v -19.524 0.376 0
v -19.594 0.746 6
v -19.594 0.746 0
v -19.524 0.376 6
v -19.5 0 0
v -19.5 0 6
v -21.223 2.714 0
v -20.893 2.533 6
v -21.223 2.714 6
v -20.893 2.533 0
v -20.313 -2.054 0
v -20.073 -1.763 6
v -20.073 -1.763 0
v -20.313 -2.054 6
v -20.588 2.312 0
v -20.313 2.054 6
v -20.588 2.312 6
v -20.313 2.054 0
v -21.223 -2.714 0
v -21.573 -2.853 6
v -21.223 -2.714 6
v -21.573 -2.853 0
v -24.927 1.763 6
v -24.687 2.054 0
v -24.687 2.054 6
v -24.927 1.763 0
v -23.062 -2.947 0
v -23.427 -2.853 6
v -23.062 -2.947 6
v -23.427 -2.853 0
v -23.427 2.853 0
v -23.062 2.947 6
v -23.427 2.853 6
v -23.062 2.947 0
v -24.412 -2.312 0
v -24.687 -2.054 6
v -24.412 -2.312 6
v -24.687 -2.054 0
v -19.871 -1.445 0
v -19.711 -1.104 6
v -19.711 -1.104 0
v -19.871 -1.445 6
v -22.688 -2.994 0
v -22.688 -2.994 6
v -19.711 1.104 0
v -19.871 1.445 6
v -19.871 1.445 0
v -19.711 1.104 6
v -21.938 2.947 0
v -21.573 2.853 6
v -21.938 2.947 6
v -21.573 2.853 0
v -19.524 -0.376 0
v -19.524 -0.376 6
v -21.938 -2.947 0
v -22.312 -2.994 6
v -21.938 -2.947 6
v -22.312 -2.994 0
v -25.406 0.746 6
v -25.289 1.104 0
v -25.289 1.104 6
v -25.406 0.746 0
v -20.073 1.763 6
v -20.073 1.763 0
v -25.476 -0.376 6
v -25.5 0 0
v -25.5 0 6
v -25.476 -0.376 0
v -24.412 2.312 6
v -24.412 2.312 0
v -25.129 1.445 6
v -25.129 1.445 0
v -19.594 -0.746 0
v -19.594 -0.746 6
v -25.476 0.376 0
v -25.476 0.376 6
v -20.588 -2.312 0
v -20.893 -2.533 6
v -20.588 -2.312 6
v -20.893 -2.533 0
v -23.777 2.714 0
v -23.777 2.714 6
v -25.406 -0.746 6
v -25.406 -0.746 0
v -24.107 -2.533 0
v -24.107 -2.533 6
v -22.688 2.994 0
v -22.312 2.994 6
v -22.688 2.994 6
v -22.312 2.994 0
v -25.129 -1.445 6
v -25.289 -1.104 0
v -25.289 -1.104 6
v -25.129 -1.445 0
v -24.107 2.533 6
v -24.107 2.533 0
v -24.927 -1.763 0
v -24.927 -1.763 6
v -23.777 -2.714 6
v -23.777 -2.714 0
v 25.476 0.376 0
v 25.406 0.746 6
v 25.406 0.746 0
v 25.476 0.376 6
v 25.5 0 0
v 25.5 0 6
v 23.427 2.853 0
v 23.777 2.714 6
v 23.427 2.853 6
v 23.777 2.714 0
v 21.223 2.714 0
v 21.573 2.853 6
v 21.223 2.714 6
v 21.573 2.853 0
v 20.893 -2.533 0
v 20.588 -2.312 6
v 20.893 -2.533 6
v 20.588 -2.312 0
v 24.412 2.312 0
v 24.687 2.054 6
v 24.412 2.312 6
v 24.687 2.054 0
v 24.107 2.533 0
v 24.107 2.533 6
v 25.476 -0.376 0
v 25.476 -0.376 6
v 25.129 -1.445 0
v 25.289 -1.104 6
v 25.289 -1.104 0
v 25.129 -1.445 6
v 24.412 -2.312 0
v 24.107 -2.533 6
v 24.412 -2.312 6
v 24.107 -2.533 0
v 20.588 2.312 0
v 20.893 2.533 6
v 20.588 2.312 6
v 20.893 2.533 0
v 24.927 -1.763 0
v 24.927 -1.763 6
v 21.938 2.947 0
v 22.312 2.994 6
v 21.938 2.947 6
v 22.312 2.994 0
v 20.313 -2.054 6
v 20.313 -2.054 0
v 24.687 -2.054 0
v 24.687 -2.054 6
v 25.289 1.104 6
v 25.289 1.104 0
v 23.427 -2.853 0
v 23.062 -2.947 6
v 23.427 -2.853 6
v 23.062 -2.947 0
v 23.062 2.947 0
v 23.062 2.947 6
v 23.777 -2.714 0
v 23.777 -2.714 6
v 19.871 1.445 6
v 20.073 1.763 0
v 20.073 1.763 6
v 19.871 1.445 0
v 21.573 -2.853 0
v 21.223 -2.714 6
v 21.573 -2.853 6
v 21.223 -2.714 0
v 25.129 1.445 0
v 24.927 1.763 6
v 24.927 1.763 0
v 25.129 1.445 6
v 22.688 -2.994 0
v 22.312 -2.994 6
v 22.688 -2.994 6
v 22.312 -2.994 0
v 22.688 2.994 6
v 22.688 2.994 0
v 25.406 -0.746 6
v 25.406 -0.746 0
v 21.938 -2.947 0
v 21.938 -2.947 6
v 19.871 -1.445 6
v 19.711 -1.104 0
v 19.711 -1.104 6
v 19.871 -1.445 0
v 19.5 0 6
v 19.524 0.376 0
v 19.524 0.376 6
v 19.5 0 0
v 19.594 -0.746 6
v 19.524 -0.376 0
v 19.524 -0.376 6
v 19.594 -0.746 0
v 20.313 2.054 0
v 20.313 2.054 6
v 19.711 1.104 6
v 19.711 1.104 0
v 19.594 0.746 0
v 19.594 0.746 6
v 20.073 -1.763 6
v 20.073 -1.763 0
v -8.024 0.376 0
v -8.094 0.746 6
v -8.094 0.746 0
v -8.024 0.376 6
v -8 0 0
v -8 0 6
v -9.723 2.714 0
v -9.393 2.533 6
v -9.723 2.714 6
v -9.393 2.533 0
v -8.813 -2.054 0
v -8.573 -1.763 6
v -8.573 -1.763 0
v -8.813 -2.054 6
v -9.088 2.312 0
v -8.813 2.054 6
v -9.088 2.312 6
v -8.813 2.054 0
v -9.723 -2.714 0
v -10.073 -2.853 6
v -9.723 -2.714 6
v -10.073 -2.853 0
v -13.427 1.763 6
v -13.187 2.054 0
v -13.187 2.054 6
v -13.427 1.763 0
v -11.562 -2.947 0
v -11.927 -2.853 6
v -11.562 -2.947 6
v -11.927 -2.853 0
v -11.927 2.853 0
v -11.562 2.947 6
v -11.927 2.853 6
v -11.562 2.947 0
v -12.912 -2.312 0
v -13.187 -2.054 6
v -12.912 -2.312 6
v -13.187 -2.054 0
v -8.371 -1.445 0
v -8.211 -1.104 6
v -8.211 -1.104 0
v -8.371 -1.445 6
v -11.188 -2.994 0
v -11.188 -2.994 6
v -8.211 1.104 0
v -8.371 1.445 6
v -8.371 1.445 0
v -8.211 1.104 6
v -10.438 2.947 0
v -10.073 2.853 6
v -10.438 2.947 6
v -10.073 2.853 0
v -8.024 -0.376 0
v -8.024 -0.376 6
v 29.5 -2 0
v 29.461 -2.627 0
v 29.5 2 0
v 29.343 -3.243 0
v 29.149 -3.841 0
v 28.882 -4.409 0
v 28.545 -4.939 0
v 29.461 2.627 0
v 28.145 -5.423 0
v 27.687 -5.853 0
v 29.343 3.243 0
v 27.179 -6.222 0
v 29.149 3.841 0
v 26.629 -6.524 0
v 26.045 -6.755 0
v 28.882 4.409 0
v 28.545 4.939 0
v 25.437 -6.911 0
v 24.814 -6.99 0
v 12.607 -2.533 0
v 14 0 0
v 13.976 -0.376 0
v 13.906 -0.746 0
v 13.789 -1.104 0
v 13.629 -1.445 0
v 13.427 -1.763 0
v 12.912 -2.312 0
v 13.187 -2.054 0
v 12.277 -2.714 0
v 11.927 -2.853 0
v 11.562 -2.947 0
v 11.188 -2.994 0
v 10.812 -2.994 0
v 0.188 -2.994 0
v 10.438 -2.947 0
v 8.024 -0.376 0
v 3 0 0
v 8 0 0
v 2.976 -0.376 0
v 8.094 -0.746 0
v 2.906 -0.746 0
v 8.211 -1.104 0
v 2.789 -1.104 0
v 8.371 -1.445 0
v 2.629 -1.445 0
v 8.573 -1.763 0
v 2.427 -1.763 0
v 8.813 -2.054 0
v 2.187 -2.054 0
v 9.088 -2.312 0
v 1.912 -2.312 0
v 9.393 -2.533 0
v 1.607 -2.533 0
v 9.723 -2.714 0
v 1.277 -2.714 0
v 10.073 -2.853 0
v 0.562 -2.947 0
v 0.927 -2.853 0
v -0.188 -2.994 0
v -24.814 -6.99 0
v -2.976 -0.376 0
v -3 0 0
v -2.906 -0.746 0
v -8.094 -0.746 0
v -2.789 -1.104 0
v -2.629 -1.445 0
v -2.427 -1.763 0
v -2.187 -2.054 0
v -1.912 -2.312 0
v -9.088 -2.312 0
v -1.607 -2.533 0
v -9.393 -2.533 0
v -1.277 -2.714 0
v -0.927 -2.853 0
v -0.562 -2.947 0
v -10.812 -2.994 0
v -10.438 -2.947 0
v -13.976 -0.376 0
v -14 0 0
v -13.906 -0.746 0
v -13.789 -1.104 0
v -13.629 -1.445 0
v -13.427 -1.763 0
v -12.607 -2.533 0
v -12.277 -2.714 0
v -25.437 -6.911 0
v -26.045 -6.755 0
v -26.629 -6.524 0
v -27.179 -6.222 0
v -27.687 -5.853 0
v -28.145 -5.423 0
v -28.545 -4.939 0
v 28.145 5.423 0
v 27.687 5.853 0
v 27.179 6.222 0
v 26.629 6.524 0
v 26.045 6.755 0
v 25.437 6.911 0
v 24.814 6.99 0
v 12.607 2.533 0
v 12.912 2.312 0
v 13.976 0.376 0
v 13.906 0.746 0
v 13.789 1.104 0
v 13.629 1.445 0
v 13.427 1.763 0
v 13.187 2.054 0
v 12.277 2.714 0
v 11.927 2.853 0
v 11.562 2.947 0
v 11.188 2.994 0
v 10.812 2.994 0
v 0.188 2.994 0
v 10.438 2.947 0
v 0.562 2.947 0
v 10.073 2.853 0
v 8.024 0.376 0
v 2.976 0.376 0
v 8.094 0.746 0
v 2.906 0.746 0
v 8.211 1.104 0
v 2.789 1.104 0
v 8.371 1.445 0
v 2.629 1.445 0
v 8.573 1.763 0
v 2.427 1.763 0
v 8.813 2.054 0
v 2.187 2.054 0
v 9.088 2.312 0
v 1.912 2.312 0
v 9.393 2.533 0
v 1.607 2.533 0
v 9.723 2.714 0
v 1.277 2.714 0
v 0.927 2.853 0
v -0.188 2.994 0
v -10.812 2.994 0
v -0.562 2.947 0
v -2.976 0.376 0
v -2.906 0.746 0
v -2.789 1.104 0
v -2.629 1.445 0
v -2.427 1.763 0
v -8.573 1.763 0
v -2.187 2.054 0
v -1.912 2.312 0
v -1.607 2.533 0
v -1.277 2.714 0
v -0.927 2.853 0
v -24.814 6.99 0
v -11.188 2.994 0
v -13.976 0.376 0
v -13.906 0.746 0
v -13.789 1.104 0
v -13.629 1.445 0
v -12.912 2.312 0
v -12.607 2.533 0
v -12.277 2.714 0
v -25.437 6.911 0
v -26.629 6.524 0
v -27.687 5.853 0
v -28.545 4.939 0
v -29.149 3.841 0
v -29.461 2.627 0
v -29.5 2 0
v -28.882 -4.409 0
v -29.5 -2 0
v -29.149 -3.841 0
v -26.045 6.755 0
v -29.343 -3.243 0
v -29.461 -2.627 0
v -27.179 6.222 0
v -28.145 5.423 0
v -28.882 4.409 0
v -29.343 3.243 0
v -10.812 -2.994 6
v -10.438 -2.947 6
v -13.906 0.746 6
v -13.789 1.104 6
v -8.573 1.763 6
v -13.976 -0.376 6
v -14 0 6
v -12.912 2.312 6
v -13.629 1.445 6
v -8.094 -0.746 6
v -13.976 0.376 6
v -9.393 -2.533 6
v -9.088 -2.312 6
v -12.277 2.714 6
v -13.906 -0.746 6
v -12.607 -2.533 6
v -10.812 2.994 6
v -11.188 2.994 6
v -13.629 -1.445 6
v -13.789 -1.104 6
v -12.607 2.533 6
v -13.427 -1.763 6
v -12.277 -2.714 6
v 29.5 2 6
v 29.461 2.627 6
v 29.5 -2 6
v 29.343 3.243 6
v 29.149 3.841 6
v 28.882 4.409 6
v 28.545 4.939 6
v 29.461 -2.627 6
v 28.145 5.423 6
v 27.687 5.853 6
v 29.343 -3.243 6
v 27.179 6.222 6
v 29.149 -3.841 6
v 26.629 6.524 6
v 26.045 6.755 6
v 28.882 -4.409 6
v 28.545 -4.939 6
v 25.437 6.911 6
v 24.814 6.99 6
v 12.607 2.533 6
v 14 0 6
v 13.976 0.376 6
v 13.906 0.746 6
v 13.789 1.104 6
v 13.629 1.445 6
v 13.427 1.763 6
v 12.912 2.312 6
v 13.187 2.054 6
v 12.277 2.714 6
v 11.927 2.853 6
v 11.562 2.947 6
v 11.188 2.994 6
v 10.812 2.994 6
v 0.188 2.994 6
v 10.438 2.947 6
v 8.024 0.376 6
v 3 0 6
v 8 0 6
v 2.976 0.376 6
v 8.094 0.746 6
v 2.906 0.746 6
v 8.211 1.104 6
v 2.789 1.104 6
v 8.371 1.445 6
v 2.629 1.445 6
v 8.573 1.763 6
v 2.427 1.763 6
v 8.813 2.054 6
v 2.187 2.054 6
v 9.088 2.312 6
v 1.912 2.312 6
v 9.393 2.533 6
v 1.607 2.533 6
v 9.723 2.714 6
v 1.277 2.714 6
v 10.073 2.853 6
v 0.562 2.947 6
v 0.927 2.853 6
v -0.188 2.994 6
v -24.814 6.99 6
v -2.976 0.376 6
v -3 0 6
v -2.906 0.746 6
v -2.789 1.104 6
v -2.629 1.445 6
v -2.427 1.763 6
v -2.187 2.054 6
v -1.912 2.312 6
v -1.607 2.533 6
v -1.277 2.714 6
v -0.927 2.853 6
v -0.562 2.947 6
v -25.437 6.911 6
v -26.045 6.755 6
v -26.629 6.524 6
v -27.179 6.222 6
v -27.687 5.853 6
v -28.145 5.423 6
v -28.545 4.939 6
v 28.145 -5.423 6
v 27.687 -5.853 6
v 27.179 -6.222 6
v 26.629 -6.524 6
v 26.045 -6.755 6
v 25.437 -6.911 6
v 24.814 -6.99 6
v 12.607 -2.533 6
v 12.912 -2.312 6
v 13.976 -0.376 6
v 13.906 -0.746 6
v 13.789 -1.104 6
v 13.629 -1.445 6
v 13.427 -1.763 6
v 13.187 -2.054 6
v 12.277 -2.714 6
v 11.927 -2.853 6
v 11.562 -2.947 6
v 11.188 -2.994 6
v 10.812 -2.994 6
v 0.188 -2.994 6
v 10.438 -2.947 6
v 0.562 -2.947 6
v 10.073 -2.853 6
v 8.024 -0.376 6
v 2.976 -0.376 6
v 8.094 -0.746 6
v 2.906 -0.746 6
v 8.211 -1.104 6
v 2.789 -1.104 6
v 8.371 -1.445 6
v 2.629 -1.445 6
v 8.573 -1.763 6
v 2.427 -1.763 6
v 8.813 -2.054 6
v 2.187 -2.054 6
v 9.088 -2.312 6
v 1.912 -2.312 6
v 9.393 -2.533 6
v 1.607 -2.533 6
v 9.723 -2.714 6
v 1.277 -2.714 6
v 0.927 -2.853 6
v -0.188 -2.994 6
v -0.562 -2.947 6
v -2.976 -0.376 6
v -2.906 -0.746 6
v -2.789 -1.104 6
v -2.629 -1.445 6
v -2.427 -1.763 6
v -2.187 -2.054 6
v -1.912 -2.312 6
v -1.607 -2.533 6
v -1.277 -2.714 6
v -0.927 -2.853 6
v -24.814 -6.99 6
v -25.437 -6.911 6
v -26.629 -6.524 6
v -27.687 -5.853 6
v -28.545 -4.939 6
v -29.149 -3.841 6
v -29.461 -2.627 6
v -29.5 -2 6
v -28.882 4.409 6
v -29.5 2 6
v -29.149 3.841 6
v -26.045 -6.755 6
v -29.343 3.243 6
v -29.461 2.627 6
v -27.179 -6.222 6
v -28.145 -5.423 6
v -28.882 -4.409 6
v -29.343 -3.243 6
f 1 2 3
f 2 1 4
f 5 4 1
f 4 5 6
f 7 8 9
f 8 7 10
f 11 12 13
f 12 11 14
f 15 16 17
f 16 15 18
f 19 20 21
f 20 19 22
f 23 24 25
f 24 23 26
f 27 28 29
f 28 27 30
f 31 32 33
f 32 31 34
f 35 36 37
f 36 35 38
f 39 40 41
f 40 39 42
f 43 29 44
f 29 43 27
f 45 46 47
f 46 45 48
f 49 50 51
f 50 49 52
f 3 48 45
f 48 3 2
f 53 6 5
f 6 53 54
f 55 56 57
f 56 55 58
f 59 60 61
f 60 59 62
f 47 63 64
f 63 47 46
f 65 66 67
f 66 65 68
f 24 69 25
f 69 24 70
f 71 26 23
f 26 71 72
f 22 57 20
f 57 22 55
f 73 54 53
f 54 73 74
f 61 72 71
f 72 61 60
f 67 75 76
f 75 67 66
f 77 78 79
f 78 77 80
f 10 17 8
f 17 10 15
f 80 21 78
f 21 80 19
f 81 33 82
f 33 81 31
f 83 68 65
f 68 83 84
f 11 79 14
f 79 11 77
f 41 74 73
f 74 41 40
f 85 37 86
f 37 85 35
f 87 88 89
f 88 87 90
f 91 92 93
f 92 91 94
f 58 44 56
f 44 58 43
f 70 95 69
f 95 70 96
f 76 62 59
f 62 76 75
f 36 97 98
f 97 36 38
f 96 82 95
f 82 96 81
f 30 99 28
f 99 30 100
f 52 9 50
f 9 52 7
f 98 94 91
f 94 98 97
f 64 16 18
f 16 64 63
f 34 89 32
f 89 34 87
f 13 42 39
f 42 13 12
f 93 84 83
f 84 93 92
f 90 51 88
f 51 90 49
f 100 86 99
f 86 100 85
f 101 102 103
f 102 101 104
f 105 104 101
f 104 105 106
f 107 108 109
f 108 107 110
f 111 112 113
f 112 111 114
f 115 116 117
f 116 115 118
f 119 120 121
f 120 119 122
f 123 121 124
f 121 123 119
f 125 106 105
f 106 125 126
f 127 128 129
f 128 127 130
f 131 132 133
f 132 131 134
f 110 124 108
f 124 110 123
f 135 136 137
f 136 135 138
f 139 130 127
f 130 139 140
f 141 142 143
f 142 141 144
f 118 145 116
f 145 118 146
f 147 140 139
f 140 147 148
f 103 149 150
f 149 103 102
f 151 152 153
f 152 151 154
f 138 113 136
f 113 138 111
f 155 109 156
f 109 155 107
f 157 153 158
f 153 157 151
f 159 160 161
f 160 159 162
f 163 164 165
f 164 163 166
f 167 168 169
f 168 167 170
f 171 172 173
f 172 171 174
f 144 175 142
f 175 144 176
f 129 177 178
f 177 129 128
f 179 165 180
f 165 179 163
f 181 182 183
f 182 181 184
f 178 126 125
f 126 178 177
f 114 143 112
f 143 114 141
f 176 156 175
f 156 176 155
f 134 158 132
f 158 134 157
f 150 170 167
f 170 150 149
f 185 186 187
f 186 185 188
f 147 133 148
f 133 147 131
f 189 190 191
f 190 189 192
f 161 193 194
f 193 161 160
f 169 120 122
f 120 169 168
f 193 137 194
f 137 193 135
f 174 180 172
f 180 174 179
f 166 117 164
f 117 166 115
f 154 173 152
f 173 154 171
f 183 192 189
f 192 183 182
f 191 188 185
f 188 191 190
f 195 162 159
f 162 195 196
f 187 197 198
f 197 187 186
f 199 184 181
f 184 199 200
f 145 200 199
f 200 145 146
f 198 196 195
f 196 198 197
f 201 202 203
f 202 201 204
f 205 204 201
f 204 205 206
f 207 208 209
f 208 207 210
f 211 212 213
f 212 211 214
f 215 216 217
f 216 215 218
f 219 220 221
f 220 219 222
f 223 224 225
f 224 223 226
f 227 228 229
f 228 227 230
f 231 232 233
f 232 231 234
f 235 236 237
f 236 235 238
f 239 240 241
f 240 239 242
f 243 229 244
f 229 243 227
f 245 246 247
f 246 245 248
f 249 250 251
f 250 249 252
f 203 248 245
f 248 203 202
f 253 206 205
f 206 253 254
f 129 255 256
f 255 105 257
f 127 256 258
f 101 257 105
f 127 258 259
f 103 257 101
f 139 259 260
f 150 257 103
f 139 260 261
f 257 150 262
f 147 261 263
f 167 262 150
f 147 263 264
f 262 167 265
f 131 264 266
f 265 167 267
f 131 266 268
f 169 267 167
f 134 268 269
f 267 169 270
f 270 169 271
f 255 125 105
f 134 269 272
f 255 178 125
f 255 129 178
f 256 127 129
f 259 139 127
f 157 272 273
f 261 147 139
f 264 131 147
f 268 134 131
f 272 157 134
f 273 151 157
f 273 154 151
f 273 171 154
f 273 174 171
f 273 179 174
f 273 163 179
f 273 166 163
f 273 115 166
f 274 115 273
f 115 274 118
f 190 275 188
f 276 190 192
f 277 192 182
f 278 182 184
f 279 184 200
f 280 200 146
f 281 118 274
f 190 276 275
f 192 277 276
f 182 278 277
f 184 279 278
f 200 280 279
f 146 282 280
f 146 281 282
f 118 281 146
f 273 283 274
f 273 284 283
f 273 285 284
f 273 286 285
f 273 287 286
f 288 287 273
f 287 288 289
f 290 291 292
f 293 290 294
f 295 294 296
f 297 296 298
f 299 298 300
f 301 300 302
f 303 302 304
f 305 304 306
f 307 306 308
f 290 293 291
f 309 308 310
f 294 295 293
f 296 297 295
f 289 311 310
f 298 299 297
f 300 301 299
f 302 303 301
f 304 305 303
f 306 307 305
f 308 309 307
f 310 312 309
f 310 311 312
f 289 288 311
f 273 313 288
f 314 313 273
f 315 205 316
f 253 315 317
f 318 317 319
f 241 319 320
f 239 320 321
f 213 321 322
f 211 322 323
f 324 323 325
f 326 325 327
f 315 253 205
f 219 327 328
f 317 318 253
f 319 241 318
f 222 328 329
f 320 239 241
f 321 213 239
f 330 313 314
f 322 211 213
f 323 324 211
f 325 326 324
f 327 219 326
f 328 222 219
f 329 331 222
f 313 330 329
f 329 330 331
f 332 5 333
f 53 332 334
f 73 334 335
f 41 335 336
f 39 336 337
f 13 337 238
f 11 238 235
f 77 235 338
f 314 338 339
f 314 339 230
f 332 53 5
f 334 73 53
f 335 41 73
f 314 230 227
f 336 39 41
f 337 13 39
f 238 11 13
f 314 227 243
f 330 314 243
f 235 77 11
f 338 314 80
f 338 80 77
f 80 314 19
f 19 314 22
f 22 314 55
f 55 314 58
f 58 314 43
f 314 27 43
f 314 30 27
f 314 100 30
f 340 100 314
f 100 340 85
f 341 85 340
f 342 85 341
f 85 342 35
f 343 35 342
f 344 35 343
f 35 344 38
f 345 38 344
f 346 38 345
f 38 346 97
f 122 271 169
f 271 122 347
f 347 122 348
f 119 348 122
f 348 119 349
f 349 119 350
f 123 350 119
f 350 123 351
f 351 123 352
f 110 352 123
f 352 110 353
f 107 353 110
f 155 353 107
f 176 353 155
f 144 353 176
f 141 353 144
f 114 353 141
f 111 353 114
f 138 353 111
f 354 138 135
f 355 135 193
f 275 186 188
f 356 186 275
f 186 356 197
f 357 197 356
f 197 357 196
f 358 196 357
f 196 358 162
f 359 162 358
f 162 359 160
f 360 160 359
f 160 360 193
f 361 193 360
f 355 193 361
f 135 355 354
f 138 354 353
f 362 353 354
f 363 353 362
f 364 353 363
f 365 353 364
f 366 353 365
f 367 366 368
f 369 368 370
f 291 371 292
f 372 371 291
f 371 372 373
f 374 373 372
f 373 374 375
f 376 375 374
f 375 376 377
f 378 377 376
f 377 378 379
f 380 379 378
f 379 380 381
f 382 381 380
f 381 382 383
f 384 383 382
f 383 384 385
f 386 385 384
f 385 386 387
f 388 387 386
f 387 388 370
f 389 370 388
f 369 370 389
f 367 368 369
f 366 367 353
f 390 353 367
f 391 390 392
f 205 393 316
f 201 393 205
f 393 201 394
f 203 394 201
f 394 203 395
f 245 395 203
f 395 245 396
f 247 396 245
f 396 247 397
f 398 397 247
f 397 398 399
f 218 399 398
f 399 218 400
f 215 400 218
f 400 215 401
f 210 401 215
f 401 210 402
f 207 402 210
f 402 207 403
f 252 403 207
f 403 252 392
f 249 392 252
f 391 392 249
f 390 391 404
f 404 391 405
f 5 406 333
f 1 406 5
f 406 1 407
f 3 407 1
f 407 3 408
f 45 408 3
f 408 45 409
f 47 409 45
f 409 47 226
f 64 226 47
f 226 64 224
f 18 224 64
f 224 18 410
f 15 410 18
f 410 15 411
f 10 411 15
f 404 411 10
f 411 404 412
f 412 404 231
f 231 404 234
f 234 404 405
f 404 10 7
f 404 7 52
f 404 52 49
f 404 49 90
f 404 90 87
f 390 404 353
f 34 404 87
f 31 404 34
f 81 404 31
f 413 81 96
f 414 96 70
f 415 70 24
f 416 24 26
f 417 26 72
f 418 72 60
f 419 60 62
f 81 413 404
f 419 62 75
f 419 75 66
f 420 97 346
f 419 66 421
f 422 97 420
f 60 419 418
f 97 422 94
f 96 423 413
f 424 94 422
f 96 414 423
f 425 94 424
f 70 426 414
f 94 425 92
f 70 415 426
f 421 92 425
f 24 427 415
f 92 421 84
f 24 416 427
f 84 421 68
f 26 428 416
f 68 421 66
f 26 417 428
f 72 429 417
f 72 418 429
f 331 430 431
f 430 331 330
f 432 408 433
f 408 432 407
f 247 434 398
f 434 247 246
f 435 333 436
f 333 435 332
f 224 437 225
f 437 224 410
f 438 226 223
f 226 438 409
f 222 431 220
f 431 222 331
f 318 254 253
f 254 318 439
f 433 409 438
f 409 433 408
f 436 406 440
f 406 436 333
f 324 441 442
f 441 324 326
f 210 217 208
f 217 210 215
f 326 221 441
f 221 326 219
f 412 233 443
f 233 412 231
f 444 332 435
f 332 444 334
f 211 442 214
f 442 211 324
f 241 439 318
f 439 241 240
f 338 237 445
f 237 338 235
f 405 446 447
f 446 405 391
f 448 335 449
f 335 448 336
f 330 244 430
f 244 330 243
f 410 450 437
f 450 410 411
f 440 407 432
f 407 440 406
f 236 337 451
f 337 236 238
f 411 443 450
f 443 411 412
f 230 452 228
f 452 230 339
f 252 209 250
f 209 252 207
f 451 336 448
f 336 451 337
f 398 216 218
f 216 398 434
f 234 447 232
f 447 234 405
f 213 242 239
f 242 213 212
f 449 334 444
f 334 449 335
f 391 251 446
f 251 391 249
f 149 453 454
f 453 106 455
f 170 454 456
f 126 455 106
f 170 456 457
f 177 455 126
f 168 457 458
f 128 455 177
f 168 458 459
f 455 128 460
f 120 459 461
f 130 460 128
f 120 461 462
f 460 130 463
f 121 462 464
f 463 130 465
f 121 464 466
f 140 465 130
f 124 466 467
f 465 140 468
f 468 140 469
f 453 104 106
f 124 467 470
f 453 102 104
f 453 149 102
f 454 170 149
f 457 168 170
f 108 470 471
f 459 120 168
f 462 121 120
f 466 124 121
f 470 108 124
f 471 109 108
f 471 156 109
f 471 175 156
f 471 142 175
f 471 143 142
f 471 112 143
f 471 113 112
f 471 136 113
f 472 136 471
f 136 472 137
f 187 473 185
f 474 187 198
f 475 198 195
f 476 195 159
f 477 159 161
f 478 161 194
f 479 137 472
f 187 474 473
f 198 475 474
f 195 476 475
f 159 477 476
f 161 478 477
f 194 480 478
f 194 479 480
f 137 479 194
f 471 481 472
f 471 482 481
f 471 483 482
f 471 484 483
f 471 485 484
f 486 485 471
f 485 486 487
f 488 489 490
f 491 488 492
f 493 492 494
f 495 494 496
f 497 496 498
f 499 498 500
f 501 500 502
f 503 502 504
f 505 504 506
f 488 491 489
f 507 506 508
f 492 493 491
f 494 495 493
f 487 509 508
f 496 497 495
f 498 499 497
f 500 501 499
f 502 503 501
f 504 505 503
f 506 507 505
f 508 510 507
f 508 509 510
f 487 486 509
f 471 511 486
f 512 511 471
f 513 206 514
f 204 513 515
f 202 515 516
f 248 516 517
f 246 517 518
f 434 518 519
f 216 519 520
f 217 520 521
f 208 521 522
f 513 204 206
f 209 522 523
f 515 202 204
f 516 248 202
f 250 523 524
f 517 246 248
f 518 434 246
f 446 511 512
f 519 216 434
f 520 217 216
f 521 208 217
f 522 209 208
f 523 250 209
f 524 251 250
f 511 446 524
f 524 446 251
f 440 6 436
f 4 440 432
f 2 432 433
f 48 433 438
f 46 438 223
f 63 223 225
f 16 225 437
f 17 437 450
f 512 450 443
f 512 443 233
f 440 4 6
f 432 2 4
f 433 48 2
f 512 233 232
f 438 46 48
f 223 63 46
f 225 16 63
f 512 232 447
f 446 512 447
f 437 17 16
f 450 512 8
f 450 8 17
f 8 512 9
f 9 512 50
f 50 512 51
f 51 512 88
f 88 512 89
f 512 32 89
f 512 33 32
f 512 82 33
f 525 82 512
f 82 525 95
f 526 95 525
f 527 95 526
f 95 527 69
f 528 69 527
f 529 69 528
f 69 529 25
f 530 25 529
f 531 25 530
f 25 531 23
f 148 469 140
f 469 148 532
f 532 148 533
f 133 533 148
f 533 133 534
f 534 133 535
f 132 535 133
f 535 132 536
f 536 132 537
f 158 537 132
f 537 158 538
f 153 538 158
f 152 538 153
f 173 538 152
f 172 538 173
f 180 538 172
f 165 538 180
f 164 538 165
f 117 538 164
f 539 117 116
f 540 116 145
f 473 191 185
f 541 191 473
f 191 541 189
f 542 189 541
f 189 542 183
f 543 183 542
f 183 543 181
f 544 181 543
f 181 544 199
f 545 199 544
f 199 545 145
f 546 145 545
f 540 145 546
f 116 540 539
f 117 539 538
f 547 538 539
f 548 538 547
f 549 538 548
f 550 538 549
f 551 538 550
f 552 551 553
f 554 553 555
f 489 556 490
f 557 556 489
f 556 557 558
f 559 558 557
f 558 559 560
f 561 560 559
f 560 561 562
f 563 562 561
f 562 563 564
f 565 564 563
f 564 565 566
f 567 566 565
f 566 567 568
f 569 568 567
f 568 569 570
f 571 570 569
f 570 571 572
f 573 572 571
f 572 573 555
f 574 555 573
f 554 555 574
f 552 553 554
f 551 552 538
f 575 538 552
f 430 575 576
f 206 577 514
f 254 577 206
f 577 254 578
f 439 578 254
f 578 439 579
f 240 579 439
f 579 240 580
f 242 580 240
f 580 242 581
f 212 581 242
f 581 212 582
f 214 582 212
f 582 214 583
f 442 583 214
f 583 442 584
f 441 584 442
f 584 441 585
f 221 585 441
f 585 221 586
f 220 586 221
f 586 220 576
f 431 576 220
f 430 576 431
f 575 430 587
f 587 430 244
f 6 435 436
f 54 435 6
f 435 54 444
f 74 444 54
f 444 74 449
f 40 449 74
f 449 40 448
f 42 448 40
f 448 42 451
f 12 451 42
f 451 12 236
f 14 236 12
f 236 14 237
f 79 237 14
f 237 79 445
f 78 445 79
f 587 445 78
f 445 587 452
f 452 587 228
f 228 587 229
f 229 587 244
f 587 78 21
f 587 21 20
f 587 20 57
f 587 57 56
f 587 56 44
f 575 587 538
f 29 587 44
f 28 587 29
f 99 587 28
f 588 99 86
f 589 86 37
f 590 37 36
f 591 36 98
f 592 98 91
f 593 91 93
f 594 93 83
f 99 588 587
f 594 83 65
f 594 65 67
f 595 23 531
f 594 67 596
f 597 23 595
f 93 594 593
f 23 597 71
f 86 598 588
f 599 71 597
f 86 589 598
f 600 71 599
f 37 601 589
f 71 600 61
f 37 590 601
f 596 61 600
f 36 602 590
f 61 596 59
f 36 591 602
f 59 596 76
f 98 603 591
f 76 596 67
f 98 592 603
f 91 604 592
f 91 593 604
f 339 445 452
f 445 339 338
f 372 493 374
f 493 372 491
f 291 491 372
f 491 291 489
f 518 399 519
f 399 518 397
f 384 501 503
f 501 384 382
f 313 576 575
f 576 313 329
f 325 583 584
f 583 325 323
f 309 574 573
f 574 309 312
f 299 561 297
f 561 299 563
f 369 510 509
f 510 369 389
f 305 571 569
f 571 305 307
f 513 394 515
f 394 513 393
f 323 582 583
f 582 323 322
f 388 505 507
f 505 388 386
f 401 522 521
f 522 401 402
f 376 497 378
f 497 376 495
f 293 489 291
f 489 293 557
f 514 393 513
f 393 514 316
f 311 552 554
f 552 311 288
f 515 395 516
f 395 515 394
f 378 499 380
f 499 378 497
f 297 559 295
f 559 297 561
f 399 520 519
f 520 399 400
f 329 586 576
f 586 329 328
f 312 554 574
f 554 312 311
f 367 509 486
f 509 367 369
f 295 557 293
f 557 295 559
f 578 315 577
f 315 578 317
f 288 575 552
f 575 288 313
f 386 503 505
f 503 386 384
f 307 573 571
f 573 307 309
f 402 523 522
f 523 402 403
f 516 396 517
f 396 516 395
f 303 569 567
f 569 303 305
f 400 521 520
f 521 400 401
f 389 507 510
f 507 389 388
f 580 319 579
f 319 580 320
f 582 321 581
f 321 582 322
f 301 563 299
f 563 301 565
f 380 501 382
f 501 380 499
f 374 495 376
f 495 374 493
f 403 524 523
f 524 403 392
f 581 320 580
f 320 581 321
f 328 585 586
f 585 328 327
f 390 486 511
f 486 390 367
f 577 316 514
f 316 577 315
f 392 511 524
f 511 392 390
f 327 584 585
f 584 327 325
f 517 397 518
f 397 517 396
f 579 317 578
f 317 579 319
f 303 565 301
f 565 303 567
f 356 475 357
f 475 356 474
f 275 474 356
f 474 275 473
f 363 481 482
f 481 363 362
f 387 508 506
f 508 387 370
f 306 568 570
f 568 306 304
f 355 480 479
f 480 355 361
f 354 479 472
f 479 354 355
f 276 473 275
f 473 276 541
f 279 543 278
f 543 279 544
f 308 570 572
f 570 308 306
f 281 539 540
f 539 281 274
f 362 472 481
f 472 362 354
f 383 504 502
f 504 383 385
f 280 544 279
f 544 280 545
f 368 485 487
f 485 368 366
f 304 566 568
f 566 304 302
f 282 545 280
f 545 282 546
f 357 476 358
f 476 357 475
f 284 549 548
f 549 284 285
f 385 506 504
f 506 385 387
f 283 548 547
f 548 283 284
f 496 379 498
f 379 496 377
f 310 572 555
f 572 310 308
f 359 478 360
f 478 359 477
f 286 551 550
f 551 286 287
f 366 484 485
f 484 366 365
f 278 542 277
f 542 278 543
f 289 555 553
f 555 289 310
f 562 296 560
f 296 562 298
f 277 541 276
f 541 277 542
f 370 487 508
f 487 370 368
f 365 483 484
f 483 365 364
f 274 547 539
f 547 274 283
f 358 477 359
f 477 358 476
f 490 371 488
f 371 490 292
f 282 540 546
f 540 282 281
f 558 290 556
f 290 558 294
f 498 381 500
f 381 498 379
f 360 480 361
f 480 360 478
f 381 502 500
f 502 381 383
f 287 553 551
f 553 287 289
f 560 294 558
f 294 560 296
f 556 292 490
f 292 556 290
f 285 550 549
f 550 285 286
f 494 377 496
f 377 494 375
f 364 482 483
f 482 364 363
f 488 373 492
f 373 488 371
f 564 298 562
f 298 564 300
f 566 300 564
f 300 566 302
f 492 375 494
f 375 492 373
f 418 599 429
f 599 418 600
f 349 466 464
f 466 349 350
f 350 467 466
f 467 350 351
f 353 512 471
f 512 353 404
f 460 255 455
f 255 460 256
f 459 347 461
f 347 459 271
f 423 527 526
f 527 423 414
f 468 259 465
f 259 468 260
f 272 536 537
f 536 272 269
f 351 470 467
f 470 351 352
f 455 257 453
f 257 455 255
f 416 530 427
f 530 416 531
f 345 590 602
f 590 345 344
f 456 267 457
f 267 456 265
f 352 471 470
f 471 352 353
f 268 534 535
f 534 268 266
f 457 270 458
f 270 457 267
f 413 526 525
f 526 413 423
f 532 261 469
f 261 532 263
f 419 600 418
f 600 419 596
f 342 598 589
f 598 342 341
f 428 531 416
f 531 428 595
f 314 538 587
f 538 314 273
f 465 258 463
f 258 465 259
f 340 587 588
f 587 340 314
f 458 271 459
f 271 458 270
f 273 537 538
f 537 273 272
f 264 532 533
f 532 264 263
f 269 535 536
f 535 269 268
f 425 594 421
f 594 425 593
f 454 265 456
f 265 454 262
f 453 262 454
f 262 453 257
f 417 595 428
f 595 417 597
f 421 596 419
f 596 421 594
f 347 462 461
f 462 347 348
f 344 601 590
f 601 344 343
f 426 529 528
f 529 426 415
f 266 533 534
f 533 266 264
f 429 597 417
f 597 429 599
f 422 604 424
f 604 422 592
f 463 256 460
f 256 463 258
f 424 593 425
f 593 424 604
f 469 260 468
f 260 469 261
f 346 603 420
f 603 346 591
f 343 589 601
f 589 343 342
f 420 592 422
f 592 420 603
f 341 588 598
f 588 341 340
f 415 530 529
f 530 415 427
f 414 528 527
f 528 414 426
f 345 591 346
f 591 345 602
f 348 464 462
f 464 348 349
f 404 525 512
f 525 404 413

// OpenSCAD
$fn = 50;


difference() {
	union() {
		hull() {
			translate(v = [-24.5000000000, 2.0000000000, 0]) {
				cylinder(h = 6, r = 5);
			}
			translate(v = [24.5000000000, 2.0000000000, 0]) {
				cylinder(h = 6, r = 5);
			}
			translate(v = [-24.5000000000, -2.0000000000, 0]) {
				cylinder(h = 6, r = 5);
			}
			translate(v = [24.5000000000, -2.0000000000, 0]) {
				cylinder(h = 6, r = 5);
			}
		}
	}
	union() {
		#translate(v = [-22.5000000000, 0.0000000000, 0]) {
			cylinder(h = 6, r = 3.0000000000);
		}
		#translate(v = [22.5000000000, 0.0000000000, 0]) {
			cylinder(h = 6, r = 3.0000000000);
		}
		#translate(v = [-22.5000000000, 0.0000000000, -100.0000000000]) {
			cylinder(h = 200, r = 3.0000000000);
		}
		#translate(v = [-22.5000000000, 0.0000000000, -100.0000000000]) {
			cylinder(h = 200, r = 3.0000000000);
		}
		#translate(v = [22.5000000000, 0.0000000000, -100.0000000000]) {
			cylinder(h = 200, r = 3.0000000000);
		}
		#translate(v = [22.5000000000, 0.0000000000, -100.0000000000]) {
			cylinder(h = 200, r = 3.0000000000);
		}
		#translate(v = [-22.5000000000, 0.0000000000, 0]) {
			cylinder(h = 6, r = 1.5000000000);
		}
		#translate(v = [22.5000000000, 0.0000000000, 0]) {
			cylinder(h = 6, r = 1.5000000000);
		}
		#translate(v = [-22.5000000000, 0.0000000000, 0]) {
			cylinder(h = 6, r = 1.5000000000);
		}
		#translate(v = [22.5000000000, 0.0000000000, 0]) {
			cylinder(h = 6, r = 1.5000000000);
		}
		#translate(v = [-22.5000000000, 0.0000000000, 0]) {
			cylinder(h = 6, r = 1.5000000000);
		}
		#translate(v = [22.5000000000, 0.0000000000, 0]) {
			cylinder(h = 6, r = 1.5000000000);
		}
		#translate(v = [-11.0000000000, 0, 0]) {
			cylinder(h = 6, r = 3.0000000000);
		}
		#cylinder(h = 6, r = 3.0000000000);
		#translate(v = [11.0000000000, 0, 0]) {
			cylinder(h = 6, r = 3.0000000000);
		}
	}
}
